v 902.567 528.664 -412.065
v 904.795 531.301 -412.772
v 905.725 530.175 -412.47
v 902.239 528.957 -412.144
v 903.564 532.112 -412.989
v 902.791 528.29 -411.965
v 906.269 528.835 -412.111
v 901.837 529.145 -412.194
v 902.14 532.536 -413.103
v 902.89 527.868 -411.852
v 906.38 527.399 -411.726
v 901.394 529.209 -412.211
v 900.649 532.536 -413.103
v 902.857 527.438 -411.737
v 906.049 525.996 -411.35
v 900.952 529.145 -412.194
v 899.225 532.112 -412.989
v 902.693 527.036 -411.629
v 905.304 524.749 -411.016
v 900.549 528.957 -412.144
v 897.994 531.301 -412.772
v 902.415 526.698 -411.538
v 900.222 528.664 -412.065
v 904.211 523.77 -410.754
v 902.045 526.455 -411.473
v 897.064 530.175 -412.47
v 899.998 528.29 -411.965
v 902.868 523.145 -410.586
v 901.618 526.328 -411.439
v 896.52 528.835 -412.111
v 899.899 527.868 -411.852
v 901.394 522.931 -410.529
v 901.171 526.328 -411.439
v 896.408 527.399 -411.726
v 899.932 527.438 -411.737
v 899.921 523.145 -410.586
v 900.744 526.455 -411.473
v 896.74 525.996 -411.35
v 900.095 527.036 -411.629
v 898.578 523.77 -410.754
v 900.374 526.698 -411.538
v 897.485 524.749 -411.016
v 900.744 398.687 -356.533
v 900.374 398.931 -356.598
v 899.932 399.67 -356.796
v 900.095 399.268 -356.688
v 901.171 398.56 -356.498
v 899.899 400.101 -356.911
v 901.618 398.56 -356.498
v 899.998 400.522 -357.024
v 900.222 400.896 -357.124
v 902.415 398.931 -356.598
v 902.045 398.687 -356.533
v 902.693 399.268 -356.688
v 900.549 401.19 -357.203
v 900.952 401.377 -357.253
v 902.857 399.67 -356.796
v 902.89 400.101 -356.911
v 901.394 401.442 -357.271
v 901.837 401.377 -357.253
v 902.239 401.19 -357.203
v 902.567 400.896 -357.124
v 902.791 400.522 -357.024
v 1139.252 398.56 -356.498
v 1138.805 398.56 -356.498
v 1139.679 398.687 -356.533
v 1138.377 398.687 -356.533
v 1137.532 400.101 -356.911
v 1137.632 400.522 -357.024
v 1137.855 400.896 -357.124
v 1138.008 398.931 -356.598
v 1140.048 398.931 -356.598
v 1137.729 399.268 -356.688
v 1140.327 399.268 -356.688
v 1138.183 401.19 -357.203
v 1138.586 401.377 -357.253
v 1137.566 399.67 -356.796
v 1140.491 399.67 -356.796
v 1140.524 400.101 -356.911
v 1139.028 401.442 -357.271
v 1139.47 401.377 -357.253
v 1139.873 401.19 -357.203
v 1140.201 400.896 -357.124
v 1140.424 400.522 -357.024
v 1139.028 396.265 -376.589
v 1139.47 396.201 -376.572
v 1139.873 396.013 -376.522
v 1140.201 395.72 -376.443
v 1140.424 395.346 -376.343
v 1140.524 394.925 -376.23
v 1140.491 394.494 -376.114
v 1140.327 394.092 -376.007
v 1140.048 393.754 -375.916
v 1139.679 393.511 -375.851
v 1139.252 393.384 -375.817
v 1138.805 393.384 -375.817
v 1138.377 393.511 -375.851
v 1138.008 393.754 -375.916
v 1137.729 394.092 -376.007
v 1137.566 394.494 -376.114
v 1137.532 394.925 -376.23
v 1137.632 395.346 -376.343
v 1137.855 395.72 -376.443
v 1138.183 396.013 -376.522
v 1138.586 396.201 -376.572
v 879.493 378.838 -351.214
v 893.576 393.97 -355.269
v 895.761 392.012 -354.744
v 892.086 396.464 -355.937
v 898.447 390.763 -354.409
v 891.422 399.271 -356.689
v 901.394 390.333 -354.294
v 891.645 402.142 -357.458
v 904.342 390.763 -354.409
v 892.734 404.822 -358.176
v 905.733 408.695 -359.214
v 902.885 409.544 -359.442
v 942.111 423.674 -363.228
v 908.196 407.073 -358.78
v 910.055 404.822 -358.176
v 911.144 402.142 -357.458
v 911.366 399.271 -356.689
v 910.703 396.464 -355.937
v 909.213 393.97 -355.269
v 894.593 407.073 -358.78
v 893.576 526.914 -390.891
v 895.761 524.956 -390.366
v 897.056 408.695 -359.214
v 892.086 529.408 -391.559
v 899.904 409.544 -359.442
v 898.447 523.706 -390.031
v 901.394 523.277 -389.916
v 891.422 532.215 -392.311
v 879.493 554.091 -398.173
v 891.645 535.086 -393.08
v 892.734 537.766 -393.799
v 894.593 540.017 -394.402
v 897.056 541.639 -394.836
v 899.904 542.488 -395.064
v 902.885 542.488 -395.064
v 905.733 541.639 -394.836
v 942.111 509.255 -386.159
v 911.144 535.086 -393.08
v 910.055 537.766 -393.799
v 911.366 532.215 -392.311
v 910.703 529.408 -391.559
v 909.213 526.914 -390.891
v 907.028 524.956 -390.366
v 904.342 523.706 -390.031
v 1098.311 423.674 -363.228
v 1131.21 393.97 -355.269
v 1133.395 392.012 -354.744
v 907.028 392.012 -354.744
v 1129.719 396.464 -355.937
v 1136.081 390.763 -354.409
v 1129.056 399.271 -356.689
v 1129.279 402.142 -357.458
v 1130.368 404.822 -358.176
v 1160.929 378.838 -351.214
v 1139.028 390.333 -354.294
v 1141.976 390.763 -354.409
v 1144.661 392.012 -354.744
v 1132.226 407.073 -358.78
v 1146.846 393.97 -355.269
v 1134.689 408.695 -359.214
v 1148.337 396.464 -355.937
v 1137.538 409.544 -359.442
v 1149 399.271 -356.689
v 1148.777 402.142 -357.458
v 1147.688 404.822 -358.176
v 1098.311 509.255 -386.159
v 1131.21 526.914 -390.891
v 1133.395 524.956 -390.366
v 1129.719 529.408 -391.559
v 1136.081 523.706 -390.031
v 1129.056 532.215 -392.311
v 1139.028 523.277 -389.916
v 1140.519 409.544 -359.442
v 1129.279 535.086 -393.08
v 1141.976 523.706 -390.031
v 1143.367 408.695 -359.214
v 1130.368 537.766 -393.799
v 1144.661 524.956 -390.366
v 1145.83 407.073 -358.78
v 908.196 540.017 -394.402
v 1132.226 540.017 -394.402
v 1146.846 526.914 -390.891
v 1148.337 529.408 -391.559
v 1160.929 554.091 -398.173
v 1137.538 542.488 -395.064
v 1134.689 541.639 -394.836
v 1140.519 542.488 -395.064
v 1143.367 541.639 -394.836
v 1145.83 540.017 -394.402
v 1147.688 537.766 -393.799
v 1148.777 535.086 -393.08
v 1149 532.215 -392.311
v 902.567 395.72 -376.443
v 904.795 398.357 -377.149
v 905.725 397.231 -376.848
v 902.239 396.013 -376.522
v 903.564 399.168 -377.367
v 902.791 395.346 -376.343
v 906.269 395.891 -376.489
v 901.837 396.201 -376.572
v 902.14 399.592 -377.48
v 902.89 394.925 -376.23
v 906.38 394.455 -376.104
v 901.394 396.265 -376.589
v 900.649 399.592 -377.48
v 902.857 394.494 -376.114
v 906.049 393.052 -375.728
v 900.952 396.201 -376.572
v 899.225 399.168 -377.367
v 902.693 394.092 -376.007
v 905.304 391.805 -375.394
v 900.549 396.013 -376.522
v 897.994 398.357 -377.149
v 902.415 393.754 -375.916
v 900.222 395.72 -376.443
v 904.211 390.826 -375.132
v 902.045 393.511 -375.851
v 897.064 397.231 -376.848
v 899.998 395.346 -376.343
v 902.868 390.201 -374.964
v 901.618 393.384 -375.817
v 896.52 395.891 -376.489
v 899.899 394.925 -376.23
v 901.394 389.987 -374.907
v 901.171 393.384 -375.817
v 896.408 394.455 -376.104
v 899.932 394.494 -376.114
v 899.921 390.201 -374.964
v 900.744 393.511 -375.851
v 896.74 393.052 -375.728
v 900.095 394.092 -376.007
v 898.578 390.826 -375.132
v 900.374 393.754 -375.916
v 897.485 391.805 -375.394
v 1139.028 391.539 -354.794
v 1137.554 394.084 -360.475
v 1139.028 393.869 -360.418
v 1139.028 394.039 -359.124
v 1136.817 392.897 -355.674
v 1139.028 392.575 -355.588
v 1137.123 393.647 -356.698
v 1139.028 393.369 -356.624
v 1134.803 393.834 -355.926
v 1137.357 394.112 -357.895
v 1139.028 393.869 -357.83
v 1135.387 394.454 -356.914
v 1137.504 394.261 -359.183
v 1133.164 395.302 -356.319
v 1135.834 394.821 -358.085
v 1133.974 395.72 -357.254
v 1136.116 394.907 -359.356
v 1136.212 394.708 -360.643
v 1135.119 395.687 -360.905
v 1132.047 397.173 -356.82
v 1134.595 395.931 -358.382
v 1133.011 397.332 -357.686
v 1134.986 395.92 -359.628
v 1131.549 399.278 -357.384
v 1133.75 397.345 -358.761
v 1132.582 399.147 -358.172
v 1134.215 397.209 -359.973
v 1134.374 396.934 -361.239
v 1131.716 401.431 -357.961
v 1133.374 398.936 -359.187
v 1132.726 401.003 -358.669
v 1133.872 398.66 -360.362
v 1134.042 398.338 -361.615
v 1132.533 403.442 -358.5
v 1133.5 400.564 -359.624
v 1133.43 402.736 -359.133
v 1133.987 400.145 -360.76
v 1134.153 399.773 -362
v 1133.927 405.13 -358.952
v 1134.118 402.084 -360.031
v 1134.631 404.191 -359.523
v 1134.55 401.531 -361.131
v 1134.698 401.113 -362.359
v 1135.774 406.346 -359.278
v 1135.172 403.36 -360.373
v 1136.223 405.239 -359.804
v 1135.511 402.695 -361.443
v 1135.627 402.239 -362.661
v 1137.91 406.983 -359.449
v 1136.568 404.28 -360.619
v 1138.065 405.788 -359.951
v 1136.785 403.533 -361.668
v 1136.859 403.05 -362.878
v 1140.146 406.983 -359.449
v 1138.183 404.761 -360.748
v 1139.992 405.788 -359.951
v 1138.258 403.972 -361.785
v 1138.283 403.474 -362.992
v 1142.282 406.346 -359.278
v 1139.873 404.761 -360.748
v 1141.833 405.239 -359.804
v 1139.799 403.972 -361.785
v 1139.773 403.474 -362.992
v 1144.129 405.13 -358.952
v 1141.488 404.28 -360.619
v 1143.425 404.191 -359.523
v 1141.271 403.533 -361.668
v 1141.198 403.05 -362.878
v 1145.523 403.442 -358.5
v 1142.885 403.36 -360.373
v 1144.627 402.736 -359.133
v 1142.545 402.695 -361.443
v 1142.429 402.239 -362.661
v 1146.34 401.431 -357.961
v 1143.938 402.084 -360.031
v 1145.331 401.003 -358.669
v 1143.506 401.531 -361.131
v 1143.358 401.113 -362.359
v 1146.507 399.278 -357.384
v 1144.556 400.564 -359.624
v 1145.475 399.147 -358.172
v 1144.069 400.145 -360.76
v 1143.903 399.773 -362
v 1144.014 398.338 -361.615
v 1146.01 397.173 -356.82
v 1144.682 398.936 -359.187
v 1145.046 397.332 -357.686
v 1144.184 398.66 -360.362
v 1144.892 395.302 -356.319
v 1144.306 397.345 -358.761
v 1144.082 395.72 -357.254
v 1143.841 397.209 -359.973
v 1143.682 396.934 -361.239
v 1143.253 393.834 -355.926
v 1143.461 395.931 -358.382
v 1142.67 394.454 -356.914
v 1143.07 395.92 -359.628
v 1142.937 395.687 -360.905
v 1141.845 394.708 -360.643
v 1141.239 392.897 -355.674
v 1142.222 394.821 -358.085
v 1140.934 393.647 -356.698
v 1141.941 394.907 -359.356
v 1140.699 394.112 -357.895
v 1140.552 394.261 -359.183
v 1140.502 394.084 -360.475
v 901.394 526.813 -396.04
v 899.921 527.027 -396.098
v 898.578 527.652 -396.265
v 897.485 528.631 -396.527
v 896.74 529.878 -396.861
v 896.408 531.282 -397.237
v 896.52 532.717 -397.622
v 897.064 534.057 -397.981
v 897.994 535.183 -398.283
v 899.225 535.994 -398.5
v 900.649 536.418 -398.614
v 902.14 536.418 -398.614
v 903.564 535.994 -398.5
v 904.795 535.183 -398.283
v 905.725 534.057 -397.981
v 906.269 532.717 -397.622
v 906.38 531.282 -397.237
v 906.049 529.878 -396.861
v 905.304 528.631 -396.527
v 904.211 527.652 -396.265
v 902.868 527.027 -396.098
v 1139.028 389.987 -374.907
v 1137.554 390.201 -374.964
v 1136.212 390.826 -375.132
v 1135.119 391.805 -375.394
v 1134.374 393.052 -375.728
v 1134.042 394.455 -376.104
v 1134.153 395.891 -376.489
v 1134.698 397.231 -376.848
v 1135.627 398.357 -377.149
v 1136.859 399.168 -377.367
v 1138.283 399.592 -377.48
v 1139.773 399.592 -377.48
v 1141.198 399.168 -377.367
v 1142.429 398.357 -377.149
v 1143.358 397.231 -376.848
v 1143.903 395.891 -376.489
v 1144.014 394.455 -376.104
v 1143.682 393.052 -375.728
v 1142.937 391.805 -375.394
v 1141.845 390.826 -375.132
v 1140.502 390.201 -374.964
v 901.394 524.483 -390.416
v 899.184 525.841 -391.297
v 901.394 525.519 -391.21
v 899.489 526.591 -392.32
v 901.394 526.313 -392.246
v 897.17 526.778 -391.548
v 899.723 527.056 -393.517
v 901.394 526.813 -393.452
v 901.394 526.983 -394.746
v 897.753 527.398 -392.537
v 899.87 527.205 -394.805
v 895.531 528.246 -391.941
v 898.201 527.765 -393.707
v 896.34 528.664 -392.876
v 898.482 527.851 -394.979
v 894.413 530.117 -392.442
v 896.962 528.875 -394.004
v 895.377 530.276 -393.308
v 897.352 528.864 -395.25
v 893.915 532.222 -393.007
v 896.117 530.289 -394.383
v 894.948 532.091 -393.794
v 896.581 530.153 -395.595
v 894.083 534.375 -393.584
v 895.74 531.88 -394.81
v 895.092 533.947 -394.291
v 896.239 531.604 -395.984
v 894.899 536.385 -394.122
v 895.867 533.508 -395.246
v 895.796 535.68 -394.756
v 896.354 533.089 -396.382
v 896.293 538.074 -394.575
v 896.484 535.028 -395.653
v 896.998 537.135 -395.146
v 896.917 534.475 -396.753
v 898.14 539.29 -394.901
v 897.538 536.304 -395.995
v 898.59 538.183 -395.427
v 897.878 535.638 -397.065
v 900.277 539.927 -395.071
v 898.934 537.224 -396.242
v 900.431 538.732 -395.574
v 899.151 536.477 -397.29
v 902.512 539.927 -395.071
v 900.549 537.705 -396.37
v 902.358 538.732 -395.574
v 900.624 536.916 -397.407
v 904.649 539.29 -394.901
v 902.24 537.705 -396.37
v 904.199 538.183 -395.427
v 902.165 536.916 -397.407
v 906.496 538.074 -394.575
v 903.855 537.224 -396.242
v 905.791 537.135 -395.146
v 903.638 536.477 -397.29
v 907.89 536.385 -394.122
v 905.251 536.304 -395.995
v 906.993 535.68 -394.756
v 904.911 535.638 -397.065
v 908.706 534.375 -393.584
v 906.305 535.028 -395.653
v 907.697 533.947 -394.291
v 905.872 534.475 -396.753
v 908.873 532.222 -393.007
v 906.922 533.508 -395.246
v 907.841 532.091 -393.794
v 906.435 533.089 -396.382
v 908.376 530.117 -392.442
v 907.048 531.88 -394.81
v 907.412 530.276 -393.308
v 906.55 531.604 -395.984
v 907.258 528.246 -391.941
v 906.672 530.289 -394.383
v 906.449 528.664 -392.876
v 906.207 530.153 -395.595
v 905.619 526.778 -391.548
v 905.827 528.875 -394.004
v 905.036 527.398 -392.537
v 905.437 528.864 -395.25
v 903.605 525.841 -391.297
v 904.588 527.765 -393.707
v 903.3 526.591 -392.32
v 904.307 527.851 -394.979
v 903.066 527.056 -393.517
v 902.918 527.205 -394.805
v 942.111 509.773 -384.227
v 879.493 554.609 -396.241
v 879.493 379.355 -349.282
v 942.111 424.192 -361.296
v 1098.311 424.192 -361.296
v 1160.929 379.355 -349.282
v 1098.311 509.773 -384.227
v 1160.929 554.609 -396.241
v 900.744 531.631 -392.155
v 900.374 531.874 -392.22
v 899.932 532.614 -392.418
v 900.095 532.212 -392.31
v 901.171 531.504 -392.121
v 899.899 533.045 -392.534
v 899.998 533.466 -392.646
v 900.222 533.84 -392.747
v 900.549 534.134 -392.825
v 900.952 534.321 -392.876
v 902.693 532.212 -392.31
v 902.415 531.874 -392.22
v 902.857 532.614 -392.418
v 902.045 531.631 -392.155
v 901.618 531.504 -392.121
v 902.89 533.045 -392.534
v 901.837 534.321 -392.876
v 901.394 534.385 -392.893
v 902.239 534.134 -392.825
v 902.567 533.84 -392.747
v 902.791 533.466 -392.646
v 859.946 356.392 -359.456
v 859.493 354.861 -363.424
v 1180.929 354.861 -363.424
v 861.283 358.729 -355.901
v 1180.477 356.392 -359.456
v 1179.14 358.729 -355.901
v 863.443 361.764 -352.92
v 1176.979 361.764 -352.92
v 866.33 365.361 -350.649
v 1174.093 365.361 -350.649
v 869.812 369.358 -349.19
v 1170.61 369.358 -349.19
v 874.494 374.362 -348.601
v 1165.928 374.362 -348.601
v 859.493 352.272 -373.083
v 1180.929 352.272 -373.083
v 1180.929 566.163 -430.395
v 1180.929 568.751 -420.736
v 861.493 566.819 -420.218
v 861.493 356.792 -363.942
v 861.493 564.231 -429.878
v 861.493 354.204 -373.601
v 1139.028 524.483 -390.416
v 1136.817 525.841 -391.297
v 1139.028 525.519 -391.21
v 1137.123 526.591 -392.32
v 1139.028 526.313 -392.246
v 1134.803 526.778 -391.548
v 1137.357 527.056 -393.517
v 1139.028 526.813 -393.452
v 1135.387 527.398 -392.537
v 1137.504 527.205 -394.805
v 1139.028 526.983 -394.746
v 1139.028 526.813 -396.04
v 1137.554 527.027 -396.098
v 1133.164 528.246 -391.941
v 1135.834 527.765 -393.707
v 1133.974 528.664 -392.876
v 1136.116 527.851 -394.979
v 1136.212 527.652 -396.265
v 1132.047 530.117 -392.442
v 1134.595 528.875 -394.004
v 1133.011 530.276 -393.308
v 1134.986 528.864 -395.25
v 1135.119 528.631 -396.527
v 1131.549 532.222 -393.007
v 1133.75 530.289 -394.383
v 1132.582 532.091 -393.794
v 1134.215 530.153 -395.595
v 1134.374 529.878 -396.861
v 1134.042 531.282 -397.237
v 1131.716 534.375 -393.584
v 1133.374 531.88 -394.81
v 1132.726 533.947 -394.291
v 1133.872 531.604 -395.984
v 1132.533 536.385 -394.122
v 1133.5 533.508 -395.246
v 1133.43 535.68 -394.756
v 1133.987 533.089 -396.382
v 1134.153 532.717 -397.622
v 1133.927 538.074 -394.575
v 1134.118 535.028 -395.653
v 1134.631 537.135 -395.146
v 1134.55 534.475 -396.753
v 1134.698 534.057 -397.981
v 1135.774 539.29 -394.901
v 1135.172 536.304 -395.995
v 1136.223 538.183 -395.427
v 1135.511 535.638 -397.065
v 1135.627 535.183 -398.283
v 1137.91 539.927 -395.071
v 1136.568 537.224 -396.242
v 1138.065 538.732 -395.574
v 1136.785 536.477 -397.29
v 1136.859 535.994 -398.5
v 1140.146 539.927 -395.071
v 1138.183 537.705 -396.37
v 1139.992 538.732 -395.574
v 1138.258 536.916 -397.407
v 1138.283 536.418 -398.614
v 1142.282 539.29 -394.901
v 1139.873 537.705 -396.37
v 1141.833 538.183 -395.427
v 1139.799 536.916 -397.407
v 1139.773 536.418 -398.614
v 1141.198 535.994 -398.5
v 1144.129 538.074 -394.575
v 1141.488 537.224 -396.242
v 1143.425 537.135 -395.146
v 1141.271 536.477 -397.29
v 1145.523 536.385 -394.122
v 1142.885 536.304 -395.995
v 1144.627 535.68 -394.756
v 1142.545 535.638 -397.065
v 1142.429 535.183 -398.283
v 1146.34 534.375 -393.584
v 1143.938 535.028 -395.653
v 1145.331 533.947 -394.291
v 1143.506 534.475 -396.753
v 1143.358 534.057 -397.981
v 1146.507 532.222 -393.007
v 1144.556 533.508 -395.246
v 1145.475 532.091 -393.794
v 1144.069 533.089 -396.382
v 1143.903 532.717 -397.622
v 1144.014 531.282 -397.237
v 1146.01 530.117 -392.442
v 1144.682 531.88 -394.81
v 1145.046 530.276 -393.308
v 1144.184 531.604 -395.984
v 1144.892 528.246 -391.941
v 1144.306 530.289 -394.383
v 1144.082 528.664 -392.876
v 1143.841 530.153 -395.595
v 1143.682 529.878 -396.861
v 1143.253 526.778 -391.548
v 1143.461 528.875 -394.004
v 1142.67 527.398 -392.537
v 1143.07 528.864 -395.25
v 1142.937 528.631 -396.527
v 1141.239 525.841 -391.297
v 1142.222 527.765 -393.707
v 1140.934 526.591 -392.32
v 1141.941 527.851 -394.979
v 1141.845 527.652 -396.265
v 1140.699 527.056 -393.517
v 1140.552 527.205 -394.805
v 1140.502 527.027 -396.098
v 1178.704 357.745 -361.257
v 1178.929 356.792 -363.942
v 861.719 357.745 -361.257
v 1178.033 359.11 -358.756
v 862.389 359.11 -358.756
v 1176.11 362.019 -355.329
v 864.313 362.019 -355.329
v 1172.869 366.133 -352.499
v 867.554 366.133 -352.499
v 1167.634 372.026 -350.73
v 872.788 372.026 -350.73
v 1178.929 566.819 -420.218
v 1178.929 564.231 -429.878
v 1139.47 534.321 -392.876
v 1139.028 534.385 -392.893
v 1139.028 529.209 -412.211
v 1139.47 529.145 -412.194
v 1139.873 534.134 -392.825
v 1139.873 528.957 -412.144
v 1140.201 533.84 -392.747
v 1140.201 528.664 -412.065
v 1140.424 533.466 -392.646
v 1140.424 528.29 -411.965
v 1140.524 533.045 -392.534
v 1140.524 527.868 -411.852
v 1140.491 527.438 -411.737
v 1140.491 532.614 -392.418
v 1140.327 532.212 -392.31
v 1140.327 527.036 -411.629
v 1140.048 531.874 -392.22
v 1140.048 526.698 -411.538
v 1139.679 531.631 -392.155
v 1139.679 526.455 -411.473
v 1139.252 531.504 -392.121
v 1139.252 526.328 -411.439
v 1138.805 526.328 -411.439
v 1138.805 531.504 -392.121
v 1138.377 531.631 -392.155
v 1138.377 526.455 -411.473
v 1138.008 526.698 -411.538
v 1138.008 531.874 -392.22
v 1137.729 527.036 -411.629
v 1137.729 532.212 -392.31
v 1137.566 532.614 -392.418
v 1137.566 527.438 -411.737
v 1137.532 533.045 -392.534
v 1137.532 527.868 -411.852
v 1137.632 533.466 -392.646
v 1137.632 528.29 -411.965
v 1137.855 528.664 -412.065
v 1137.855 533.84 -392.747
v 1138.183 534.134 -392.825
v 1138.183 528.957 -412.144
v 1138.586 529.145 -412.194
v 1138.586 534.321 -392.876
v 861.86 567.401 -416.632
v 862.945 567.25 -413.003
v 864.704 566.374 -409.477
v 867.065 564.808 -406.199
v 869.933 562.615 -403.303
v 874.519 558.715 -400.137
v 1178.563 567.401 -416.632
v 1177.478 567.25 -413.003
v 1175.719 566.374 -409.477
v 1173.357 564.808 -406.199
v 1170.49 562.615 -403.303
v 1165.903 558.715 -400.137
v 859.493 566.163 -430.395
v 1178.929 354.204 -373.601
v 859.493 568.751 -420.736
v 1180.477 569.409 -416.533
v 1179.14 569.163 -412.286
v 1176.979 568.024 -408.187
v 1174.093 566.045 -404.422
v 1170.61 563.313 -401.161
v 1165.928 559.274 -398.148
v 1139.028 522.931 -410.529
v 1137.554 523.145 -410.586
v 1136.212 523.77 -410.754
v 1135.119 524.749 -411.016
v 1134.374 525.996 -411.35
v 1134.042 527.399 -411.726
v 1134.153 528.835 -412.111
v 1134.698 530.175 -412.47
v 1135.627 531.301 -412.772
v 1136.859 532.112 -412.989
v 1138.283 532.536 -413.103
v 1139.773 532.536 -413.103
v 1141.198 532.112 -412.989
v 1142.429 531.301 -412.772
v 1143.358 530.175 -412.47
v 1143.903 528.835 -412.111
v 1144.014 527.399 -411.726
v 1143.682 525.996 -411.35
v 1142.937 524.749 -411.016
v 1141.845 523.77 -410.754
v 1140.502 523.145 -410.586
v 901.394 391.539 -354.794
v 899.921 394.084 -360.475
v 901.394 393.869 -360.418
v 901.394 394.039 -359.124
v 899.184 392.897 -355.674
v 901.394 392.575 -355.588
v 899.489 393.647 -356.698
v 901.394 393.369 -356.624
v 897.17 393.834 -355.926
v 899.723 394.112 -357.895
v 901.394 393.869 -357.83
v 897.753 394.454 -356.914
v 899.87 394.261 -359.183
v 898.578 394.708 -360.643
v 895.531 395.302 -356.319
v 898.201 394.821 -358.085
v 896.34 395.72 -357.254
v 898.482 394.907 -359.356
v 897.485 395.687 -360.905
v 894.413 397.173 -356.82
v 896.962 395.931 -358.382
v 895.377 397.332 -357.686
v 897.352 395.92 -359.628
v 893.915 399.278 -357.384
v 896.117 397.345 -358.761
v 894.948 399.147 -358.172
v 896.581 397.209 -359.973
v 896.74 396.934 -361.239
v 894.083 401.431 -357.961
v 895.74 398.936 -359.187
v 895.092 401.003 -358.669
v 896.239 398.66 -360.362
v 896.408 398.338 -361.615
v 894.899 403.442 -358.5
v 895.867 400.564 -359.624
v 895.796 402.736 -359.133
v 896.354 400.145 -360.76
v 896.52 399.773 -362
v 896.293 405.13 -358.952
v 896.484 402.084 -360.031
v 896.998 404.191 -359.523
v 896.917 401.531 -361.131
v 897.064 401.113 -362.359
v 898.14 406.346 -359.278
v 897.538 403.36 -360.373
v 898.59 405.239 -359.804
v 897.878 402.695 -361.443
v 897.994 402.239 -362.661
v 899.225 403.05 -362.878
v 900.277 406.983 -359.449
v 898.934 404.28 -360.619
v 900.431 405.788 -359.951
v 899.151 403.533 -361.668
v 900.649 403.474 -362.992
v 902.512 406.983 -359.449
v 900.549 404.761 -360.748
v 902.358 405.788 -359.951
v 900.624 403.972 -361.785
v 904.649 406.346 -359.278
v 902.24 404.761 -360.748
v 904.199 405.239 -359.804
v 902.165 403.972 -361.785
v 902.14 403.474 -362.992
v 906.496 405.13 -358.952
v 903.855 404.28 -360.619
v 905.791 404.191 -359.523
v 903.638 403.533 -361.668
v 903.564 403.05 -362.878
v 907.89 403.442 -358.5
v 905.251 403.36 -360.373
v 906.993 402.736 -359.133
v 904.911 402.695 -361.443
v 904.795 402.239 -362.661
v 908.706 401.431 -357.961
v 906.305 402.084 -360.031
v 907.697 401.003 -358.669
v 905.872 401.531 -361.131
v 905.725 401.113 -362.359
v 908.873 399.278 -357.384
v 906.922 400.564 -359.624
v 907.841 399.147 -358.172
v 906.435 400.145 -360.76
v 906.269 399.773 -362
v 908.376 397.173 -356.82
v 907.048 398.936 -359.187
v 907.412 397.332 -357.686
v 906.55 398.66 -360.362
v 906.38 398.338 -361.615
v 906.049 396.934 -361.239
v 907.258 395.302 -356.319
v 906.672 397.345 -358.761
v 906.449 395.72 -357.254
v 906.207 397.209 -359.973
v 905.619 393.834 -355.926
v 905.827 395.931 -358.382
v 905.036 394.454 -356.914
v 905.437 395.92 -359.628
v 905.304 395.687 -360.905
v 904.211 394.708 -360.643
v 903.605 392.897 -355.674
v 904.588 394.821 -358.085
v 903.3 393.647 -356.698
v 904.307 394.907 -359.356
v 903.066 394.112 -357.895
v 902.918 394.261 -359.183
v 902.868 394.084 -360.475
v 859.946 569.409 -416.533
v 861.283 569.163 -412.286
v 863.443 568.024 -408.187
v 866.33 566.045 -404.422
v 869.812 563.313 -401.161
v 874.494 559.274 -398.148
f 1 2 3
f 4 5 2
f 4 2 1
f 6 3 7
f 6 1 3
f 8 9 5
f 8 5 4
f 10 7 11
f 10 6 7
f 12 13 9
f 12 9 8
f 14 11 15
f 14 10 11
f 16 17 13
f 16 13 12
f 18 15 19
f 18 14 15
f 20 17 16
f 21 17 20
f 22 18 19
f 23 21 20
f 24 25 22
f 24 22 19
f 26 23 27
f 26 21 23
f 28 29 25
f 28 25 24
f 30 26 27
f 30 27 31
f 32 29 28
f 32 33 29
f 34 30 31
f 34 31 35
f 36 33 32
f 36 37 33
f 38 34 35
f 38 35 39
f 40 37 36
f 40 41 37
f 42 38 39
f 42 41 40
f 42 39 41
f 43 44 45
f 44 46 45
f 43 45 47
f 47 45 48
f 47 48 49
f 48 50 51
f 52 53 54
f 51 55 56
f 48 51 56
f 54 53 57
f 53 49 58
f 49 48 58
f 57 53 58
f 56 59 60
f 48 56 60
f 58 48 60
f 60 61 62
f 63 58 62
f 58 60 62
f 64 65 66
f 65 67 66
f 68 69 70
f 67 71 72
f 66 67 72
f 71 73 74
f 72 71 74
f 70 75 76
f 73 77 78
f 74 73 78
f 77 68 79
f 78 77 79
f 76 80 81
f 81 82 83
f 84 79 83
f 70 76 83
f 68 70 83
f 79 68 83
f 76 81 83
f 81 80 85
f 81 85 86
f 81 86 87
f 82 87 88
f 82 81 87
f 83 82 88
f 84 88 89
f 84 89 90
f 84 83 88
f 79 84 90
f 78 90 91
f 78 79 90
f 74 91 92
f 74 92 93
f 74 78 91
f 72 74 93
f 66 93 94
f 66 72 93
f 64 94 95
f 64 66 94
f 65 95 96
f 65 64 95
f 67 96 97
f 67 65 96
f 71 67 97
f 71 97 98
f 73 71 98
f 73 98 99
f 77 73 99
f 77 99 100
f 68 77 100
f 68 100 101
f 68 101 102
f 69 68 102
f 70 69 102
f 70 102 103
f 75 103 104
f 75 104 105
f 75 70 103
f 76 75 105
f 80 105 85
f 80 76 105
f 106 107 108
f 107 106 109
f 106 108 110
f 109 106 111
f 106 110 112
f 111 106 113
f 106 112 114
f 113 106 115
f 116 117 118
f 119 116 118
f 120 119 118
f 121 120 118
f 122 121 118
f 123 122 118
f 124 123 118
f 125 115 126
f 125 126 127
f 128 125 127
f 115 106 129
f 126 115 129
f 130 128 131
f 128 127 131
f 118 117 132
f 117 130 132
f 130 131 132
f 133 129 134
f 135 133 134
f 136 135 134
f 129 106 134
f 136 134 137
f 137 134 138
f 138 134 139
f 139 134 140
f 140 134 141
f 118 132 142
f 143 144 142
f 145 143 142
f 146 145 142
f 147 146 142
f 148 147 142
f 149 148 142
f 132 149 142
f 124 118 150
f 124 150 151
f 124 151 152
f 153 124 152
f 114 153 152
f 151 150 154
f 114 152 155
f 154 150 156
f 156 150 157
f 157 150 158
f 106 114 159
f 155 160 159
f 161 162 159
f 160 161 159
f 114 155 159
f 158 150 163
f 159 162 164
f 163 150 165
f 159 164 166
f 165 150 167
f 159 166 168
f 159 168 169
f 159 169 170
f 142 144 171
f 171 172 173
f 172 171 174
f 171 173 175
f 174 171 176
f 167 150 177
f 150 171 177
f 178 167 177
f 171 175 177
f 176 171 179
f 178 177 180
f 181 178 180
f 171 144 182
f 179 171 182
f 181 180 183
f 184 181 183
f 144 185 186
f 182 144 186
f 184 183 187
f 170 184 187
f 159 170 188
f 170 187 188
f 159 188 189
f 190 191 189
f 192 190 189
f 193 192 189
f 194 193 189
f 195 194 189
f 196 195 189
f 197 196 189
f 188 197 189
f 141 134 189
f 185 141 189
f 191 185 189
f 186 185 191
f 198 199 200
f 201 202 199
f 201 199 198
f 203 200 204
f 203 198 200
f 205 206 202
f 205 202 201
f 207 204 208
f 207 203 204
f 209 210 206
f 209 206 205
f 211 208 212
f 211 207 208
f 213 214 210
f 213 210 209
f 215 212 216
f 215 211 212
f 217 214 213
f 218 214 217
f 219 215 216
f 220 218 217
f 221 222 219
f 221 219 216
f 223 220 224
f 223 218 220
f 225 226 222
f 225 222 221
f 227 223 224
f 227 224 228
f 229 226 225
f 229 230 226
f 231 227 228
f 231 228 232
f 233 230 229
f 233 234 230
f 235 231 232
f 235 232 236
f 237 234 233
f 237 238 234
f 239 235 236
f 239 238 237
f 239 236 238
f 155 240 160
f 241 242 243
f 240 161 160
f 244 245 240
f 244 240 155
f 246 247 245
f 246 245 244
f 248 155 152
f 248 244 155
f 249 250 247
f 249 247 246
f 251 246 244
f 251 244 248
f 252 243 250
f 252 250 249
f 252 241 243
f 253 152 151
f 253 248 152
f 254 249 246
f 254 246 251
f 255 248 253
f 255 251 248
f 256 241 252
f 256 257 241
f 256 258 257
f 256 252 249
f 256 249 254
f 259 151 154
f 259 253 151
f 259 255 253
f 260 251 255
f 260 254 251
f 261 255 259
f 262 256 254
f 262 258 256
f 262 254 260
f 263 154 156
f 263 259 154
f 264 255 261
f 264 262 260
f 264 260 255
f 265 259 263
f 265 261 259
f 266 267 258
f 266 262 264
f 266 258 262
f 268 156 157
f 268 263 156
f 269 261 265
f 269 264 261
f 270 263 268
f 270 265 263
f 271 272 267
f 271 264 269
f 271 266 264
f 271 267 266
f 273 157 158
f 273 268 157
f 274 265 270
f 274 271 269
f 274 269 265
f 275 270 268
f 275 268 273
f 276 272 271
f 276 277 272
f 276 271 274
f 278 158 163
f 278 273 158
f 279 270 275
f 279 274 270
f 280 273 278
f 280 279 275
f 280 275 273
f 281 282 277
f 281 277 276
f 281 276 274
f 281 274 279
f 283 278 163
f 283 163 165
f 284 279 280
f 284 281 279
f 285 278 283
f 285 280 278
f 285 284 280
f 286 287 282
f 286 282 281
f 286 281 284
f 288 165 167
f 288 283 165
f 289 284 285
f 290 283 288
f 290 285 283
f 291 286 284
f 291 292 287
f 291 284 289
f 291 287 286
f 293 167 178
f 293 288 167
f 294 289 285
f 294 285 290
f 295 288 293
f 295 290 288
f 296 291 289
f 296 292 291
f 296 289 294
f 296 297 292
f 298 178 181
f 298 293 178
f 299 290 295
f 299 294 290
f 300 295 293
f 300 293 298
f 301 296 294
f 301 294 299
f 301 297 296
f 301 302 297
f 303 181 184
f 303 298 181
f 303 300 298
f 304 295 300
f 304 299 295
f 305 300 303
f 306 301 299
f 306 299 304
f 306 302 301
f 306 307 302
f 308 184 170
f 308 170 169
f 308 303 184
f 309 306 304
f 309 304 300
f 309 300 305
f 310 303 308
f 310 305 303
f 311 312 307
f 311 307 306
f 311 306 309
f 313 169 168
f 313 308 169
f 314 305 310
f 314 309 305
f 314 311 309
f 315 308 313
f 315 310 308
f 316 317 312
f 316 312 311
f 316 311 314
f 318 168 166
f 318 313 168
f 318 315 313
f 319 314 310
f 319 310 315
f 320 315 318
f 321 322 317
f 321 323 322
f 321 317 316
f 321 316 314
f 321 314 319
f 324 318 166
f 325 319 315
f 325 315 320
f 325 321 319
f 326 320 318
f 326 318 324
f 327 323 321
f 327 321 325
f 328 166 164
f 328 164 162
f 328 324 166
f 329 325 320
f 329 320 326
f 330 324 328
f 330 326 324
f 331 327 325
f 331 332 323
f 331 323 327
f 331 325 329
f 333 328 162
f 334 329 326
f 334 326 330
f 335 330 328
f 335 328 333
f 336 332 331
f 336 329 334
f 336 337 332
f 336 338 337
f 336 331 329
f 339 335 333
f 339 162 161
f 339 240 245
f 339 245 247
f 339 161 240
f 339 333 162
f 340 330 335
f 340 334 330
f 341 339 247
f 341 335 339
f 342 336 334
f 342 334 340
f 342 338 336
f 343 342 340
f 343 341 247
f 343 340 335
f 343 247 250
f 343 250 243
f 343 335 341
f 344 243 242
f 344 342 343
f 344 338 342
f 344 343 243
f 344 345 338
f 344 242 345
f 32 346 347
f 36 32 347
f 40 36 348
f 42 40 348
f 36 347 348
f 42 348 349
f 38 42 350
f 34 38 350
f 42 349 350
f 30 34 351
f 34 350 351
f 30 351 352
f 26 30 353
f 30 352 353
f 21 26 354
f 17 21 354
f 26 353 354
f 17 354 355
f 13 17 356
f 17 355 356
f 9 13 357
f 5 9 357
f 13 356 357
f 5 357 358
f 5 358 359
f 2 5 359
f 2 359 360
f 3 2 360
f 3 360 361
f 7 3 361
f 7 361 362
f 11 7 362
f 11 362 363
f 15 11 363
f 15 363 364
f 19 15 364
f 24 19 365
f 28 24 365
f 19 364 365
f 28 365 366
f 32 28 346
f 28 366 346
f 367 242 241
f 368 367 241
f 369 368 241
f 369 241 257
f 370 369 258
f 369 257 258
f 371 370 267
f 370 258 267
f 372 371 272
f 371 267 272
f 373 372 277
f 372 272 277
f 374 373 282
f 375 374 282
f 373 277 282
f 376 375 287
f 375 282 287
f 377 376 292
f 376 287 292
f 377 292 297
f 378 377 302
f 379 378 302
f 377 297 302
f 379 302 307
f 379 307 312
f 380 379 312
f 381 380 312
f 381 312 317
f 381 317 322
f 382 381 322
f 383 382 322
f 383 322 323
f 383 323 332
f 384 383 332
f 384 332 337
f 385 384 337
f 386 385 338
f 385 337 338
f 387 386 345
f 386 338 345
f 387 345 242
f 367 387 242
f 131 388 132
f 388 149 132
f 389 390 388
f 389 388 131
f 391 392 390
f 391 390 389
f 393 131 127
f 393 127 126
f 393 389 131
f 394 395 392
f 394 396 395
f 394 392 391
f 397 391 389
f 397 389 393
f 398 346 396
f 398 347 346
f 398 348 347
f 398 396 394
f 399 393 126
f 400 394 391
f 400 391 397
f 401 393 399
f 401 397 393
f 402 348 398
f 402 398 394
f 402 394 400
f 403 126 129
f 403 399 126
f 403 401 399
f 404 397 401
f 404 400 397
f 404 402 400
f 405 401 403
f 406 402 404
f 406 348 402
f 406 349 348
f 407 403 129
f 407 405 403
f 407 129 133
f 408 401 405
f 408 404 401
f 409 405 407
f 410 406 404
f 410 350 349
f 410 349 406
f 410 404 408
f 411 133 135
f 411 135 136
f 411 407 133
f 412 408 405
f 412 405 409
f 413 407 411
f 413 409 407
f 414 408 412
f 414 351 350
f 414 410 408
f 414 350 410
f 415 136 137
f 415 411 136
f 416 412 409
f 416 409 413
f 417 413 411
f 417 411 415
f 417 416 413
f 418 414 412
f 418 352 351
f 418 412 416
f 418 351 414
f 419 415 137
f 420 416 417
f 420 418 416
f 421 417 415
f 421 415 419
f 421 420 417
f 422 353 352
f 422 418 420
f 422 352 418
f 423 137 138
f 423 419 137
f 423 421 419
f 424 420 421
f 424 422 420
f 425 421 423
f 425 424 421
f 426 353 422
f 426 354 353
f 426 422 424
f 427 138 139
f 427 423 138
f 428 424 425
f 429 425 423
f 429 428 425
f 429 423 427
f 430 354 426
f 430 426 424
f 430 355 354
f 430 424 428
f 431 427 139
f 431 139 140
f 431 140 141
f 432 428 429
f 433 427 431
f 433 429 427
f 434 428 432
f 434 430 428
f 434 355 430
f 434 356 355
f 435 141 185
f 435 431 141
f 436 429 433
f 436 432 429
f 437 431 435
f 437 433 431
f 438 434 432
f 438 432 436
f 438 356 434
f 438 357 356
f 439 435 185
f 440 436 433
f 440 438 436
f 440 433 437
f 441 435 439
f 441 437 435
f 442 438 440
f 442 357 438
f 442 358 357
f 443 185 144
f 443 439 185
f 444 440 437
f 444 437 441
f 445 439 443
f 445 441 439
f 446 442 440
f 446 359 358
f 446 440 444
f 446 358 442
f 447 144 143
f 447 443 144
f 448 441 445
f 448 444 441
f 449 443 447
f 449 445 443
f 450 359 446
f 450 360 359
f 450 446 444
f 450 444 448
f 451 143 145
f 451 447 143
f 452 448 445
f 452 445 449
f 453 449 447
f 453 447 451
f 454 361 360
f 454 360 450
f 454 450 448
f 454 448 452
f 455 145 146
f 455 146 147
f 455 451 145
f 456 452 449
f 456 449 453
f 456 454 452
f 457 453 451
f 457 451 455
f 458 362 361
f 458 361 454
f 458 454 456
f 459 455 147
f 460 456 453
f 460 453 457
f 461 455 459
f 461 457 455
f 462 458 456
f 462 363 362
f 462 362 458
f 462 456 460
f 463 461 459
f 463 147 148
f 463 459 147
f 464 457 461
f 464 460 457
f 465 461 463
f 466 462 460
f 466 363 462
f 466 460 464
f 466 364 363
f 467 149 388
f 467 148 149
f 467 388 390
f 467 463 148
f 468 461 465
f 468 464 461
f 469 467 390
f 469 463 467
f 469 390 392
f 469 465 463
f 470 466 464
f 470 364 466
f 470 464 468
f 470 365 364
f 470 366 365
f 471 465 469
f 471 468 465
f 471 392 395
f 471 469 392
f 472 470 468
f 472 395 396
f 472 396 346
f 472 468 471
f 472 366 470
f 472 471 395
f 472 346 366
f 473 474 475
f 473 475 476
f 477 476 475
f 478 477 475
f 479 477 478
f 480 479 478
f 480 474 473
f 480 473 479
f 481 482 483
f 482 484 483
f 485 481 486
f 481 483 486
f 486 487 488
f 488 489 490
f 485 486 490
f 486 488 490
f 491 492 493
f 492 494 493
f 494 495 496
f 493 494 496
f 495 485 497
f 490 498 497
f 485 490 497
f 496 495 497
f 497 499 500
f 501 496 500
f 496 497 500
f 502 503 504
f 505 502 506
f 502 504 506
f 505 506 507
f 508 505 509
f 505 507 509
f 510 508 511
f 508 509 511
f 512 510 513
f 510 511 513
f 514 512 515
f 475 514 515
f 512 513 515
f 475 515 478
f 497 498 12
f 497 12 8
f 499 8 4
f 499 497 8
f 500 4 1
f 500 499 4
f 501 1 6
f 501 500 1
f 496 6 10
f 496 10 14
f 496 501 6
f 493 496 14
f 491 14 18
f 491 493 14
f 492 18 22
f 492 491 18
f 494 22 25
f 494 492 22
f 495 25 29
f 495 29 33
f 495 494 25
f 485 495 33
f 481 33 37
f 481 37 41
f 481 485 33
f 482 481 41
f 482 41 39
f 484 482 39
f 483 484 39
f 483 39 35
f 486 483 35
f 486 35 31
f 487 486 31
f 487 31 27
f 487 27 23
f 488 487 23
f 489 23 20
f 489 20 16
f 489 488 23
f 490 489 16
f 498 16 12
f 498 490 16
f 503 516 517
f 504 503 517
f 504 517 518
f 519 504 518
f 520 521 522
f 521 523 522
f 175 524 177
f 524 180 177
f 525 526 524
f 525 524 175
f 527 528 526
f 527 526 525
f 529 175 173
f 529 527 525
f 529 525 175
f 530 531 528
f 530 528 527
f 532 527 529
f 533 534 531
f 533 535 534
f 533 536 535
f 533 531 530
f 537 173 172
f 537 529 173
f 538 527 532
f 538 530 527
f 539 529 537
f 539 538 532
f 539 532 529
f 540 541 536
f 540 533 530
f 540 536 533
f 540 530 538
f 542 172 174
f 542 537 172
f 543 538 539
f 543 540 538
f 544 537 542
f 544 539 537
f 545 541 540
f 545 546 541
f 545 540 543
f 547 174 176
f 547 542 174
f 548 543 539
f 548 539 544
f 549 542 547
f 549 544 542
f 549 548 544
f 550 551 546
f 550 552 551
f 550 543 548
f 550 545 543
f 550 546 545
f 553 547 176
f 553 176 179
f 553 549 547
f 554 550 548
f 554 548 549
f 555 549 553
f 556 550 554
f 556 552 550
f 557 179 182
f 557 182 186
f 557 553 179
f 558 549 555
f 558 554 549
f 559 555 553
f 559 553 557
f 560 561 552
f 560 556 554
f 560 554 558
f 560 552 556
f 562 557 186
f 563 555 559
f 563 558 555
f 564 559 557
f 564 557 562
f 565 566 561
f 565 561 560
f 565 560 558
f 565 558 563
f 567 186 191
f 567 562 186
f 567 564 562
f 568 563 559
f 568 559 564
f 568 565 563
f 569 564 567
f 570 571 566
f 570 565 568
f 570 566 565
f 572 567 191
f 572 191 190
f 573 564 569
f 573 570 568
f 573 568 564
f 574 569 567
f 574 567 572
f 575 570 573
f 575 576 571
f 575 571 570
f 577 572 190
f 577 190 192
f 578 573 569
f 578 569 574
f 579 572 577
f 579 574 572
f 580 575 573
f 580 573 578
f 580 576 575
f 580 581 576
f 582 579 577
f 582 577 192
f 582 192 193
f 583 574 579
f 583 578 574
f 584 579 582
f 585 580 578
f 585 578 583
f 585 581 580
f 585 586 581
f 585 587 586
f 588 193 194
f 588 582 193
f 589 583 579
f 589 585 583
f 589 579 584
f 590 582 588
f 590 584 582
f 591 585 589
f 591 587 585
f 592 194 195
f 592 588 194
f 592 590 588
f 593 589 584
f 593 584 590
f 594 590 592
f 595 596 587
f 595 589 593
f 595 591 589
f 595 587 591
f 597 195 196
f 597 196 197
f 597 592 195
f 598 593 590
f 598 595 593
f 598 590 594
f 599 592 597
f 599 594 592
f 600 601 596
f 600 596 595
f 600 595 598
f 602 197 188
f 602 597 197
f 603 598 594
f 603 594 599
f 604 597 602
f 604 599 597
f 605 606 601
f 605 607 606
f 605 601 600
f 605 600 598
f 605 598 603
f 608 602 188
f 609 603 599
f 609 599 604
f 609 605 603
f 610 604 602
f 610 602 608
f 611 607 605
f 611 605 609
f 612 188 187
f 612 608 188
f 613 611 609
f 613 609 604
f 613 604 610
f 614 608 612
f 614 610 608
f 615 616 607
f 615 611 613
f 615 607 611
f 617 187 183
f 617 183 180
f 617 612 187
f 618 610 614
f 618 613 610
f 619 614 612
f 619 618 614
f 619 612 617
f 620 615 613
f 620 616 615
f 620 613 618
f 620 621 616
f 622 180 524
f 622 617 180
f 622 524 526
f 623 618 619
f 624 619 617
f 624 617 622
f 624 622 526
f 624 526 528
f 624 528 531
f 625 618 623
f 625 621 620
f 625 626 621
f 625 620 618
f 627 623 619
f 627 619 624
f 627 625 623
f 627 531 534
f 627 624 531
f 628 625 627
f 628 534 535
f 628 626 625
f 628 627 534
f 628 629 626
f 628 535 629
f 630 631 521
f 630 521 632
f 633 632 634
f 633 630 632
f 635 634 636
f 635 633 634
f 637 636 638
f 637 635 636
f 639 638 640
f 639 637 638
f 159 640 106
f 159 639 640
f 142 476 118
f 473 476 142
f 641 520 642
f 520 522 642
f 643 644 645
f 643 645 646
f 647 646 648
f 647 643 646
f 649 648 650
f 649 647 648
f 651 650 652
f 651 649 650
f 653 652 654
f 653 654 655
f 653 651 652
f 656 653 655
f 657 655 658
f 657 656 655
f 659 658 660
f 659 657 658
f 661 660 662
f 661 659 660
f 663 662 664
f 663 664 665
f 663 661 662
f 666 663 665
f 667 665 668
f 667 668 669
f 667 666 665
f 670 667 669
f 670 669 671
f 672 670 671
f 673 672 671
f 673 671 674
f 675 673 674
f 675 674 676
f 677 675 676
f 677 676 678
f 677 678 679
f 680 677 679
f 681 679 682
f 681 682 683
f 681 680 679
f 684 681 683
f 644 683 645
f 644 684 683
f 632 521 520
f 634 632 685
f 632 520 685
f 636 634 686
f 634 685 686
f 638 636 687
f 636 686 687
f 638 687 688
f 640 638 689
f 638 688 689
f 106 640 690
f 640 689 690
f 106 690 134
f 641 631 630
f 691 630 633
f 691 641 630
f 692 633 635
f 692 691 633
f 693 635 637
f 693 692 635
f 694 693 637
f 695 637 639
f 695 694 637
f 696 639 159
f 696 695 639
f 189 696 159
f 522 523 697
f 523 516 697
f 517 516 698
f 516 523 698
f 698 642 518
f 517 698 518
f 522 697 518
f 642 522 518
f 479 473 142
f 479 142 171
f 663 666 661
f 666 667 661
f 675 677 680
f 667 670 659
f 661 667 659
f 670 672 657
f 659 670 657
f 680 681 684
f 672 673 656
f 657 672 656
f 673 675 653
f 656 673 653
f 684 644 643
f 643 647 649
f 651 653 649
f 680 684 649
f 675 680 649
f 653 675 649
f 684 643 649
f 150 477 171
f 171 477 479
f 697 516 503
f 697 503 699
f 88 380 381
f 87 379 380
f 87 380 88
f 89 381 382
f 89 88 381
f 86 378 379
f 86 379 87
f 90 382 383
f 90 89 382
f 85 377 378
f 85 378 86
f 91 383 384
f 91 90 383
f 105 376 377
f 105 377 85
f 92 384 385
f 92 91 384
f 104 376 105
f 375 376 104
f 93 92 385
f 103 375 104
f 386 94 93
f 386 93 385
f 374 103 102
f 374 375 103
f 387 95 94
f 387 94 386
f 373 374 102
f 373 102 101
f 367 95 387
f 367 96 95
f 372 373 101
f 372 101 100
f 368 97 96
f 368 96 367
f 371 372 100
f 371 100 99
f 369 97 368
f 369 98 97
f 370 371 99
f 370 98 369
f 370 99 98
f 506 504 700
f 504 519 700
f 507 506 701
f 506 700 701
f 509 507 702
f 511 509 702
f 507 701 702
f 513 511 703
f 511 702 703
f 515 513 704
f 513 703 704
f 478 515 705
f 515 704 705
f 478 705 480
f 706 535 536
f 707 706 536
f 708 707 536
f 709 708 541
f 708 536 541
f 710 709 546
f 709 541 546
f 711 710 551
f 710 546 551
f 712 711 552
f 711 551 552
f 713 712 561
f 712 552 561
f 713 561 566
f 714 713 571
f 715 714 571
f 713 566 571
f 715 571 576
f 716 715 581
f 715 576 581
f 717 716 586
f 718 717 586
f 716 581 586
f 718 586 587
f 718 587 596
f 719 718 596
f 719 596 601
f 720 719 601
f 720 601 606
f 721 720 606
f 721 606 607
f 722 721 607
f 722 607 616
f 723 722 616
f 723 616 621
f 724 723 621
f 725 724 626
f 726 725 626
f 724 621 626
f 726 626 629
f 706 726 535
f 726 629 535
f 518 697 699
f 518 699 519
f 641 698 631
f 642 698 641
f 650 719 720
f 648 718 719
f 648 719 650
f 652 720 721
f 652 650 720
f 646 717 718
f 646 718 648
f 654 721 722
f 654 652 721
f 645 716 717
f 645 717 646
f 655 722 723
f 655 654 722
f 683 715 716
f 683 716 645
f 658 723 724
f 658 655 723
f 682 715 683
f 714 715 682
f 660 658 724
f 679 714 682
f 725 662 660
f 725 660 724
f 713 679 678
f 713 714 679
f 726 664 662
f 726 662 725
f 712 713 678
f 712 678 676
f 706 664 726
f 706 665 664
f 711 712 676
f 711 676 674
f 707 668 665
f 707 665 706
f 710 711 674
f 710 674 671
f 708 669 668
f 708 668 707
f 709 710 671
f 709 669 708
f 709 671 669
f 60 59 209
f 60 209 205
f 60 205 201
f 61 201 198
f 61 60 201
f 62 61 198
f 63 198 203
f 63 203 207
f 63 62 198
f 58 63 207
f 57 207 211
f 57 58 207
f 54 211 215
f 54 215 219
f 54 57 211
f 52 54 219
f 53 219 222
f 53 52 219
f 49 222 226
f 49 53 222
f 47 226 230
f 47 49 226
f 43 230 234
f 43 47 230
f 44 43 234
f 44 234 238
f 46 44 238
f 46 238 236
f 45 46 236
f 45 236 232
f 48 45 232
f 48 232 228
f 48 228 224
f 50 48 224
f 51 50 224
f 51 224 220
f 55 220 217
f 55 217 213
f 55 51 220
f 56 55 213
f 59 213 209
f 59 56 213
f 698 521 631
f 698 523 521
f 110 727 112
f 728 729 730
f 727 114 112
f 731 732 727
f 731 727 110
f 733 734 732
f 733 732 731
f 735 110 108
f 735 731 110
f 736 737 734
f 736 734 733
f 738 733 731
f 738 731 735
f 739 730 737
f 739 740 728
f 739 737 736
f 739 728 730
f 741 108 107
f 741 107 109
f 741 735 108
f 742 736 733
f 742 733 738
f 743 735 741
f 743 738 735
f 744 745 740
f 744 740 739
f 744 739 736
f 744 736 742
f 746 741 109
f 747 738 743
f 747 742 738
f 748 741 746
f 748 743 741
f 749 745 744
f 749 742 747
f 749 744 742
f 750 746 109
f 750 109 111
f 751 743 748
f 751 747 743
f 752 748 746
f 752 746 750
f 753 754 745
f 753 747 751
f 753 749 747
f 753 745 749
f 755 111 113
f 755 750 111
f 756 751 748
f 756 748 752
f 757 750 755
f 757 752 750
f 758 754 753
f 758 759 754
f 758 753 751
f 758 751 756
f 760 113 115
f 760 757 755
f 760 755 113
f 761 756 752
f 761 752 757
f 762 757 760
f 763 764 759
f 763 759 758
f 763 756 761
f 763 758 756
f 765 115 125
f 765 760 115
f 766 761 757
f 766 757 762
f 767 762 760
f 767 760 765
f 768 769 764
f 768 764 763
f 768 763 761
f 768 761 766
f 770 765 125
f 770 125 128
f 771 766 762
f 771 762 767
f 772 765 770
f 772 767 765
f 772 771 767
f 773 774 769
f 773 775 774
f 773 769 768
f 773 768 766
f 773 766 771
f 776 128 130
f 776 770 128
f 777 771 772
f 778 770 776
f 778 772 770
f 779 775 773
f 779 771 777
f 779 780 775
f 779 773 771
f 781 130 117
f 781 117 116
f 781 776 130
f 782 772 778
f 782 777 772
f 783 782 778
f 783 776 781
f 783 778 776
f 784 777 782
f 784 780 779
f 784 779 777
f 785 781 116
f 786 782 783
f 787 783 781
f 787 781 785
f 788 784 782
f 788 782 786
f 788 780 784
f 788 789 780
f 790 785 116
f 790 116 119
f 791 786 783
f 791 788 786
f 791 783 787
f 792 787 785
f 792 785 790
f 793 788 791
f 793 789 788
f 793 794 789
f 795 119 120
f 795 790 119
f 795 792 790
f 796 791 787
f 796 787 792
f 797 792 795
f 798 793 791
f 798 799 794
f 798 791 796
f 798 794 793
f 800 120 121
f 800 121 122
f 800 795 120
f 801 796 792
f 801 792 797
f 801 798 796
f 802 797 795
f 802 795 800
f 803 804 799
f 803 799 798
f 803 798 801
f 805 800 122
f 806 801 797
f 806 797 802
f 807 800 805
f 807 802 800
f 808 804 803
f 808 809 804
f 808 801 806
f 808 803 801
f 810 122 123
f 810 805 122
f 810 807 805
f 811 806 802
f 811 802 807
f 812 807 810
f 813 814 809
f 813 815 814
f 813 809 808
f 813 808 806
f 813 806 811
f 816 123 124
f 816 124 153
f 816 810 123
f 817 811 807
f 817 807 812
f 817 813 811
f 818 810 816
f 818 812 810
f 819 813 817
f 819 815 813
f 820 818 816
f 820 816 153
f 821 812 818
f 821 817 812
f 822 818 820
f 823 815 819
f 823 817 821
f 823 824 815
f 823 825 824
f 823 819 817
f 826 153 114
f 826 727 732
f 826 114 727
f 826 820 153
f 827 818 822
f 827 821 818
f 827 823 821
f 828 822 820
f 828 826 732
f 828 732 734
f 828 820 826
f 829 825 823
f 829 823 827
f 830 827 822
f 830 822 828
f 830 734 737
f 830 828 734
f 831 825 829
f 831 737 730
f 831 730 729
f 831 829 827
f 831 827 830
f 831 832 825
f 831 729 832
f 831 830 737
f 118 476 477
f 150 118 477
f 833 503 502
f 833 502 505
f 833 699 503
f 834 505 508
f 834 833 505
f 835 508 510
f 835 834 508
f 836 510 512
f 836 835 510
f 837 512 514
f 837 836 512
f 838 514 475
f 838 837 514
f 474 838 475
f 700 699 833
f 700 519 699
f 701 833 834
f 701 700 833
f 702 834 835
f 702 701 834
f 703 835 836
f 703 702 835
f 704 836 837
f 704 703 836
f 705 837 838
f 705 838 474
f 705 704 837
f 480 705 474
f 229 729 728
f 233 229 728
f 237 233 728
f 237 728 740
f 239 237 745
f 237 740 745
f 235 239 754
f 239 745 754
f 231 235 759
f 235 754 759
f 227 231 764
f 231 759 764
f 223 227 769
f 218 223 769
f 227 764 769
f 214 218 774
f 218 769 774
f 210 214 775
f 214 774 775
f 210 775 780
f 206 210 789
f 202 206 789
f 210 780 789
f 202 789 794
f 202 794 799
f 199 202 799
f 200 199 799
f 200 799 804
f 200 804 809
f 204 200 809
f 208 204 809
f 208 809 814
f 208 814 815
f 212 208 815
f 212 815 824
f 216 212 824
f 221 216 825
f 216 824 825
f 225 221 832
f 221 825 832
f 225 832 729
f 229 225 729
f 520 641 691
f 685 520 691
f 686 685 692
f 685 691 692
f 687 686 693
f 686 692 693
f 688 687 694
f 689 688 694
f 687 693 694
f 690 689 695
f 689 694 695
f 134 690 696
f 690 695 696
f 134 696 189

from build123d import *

# Parameters (mm, degrees)
SKETCH1_W           = 321.435935394
SKETCH1_H           = 221.435935394
BOSS_EXTRUDE1_DEPTH = 30
FILLET1_R           = 20
SHELL1_T            = -2
CUT_EXTRUDE1_REACH  = 1355.856
SKETCH2_W           = 156.2
SKETCH2_H           = 88.6
SKETCH5_R           = 5
SKETCH5_R_2         = 1.5
BOSS_EXTRUDE2_DEPTH = 20
FILLET2_R           = 5


with BuildPart() as part:
    # Sketch1 → Boss-Extrude1 (new body)
    with BuildSketch(Plane(origin=(0, -69.673086457, -260.023498579), x_dir=(1, 0, 0), z_dir=(0, 0.2588190451025214, 0.9659258262890682))):
        with Locations((1020.211286357, 547.548055232)):
            Rectangle(SKETCH1_W, SKETCH1_H)
    extrude(amount=BOSS_EXTRUDE1_DEPTH)

    # Fillet1
    fillet1_edges = [part.edges().sort_by_distance(p)[0] for p in [
        (859.49331866, 466.982292579, -372.761588593),
        (1020.211286357, 360.036948146, -344.105669918),
        (1180.929254054, 466.982292579, -372.761588593),
        (1020.211286357, 573.927637012, -401.417507268),
    ]]
    fillet(fillet1_edges, radius=FILLET1_R)

    # Shell1
    shell1_openings = [part.faces().sort_by_distance(p)[0] for p in [
        (1020.211286357, 459.217721226, -401.739363381),
    ]]
    offset(amount=SHELL1_T, openings=shell1_openings)

    # Sketch2 → Cut-Extrude1 (cut, up to next)
    with BuildSketch(Plane(origin=(0, -61.908515104, -231.04572379), x_dir=(1, 0, 0), z_dir=(0, 0.2588190451025213, 0.9659258262890681)), mode=Mode.PRIVATE) as cut_extrude1_sk1:
        with Locations((1020.211286357, 547.548055232)):
            Rectangle(SKETCH2_W, SKETCH2_H)
    cut_extrude1_tool1 = extrude(cut_extrude1_sk1.sketch, amount=-CUT_EXTRUDE1_REACH, mode=Mode.PRIVATE) & part.part
    add(cut_extrude1_tool1.solids().sort_by_distance((1020.211286, 466.982293, -372.761589))[0], mode=Mode.SUBTRACT)

    # Sketch5 → Boss-Extrude2 (add)
    # profile 1 of 4: a face of its own
    with BuildSketch(Plane(origin=(0, -62.426153194, -232.977575442), x_dir=(-1, 0, 0), z_dir=(0, -0.25881904510252146, -0.9659258262890681))):
        with Locations(Location((-901.394461057, 616.364880532, 0), (0, 0, 270))):
            Circle(SKETCH5_R)
        with Locations(Location((-901.394461057, 616.364880532, 0), (0, 0, 90))):
            Circle(SKETCH5_R_2, mode=Mode.SUBTRACT)
    # profile 2 of 4: a face of its own
    with BuildSketch(Plane(origin=(0, -62.426153194, -232.977575442), x_dir=(-1, 0, 0), z_dir=(0, -0.25881904510252146, -0.9659258262890681))):
        with Locations(Location((-901.394461057, 478.731229931, 0), (0, 0, 270))):
            Circle(SKETCH5_R)
        with Locations(Location((-901.394461057, 478.731229931, 0), (0, 0, 90))):
            Circle(SKETCH5_R_2, mode=Mode.SUBTRACT)
    # profile 3 of 4: a face of its own
    with BuildSketch(Plane(origin=(0, -62.426153194, -232.977575442), x_dir=(-1, 0, 0), z_dir=(0, -0.25881904510252146, -0.9659258262890681))):
        with Locations(Location((-1139.028111658, 478.731229931, 0), (0, 0, 270))):
            Circle(SKETCH5_R)
        with Locations(Location((-1139.028111658, 478.731229931, 0), (0, 0, 90))):
            Circle(SKETCH5_R_2, mode=Mode.SUBTRACT)
    # profile 4 of 4: a face of its own
    with BuildSketch(Plane(origin=(0, -62.426153194, -232.977575442), x_dir=(-1, 0, 0), z_dir=(0, -0.25881904510252146, -0.9659258262890681))):
        with Locations(Location((-1139.028111658, 616.364880532, 0), (0, 0, 270))):
            Circle(SKETCH5_R)
        with Locations(Location((-1139.028111658, 616.364880532, 0), (0, 0, 90))):
            Circle(SKETCH5_R_2, mode=Mode.SUBTRACT)
    extrude(amount=BOSS_EXTRUDE2_DEPTH)

    # Fillet2
    fillet2_edges = [part.edges().sort_by_distance(p)[0] for p in [
        (901.394461057, 537.766232461, -393.798640482),
        (901.394461057, 404.822334779, -358.17643046),
        (1139.028111658, 404.822334779, -358.17643046),
        (1139.028111658, 537.766232461, -393.798640482),
    ]]
    fillet(fillet2_edges, radius=FILLET2_R)


solid = part.part
